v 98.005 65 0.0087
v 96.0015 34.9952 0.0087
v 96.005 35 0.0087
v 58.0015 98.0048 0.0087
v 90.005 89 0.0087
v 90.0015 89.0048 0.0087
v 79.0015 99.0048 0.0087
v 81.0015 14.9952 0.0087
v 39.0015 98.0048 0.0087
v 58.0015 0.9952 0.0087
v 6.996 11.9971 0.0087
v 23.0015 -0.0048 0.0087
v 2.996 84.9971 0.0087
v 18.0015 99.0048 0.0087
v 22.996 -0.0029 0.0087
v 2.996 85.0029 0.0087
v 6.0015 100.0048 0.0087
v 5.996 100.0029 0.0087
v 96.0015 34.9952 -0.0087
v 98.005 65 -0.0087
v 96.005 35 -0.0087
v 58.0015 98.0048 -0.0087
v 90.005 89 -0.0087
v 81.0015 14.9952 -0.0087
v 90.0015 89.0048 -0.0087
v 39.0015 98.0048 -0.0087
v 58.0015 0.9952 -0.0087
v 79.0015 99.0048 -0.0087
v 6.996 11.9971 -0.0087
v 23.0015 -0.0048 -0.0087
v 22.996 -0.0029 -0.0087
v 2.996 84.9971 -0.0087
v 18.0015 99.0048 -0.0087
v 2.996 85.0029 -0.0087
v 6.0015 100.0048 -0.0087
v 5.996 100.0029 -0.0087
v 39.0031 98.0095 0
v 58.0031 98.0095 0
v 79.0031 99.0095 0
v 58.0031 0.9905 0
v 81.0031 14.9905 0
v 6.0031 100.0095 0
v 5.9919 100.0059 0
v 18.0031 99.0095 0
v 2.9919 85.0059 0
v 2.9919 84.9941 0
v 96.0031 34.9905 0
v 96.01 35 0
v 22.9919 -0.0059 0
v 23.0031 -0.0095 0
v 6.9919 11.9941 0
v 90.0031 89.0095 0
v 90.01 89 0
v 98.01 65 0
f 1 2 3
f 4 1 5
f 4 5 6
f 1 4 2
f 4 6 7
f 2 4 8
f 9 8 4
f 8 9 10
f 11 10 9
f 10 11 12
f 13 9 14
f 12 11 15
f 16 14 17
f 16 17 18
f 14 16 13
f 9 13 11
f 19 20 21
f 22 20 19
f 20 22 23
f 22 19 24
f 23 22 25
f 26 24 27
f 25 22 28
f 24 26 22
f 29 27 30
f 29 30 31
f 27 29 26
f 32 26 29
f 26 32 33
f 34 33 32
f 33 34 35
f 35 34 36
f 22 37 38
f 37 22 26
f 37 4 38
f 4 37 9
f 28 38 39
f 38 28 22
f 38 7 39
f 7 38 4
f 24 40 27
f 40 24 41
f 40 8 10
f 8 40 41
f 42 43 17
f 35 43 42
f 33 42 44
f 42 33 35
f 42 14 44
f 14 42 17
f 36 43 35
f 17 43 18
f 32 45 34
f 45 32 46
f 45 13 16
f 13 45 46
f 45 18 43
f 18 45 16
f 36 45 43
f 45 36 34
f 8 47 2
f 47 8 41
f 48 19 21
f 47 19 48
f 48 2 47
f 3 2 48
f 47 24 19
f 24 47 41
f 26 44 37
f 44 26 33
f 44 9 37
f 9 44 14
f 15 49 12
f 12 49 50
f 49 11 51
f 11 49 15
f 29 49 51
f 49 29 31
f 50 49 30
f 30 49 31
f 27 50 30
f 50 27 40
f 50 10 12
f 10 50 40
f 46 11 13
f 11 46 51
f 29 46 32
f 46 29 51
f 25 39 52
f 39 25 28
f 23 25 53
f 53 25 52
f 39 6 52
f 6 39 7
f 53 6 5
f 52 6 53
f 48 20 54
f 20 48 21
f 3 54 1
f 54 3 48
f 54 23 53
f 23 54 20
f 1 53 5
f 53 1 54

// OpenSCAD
color([0.5839405385485582,0.4048698908705002,0.6877557316706271]) hull(){
    translate([18,58]) sphere(0.01);
    translate([18,24]) sphere(0.01);
    translate([26,51]) sphere(0.01);
}
color([0.29310936231965135,0.08456113000314536,0.6409271470126323]) hull(){
    translate([18,58]) sphere(0.01);
    translate([18,24]) sphere(0.01);
    translate([7,12]) sphere(0.01);
}
color([0.38512246522478266,0.6162859510128613,0.407224705538046]) hull(){
    translate([18,58]) sphere(0.01);
    translate([26,51]) sphere(0.01);
    translate([30,57]) sphere(0.01);
}
color([0.6107800780239486,0.9541913078580654,0.09369719926319908]) hull(){
    translate([18,58]) sphere(0.01);
    translate([30,57]) sphere(0.01);
    translate([16,79]) sphere(0.01);
}
color([0.4396226851829427,0.9817497074141792,0.30111933510979894]) hull(){
    translate([18,58]) sphere(0.01);
    translate([16,79]) sphere(0.01);
    translate([6,77]) sphere(0.01);
}
color([0.08571041628526821,0.691130580335744,0.16573157374072334]) hull(){
    translate([18,58]) sphere(0.01);
    translate([6,77]) sphere(0.01);
    translate([7,12]) sphere(0.01);
}
color([0.4668304924867862,0.30100213617539295,0.3511677492745029]) hull(){
    translate([58,98]) sphere(0.01);
    translate([50,93]) sphere(0.01);
    translate([64,91]) sphere(0.01);
}
color([0.05564944269037686,0.7696481469448815,0.686275624239137]) hull(){
    translate([58,98]) sphere(0.01);
    translate([50,93]) sphere(0.01);
    translate([51,97]) sphere(0.01);
}
color([0.15447252119296884,0.35335085758162643,0.18799175914388588]) hull(){
    translate([58,98]) sphere(0.01);
    translate([39,98]) sphere(0.01);
    translate([51,97]) sphere(0.01);
}
color([0.41322879780265653,0.82270842281296,0.9057146612667819]) hull(){
    translate([58,98]) sphere(0.01);
    translate([70,96]) sphere(0.01);
    translate([79,99]) sphere(0.01);
}
color([0.9688547633127277,0.5528378273263655,0.12760284187612392]) hull(){
    translate([58,98]) sphere(0.01);
    translate([70,96]) sphere(0.01);
    translate([64,91]) sphere(0.01);
}
color([0.1710979555253146,0.7131998843266452,0.6397779425125977]) hull(){
    translate([22,90]) sphere(0.01);
    translate([20,83]) sphere(0.01);
    translate([30,90]) sphere(0.01);
}
color([0.57496968906483,0.8489371230716904,0.07944838941339594]) hull(){
    translate([22,90]) sphere(0.01);
    translate([20,83]) sphere(0.01);
    translate([15,91]) sphere(0.01);
}
color([0.040333123224873146,0.9305910632054132,0.3080440975445232]) hull(){
    translate([22,90]) sphere(0.01);
    translate([18,99]) sphere(0.01);
    translate([31,91]) sphere(0.01);
}
color([0.6084655882345898,0.4923441190446234,0.7069385087242315]) hull(){
    translate([22,90]) sphere(0.01);
    translate([18,99]) sphere(0.01);
    translate([15,91]) sphere(0.01);
}
color([0.6803385961846494,0.18024793645131376,0.10787678186317007]) hull(){
    translate([22,90]) sphere(0.01);
    translate([31,91]) sphere(0.01);
    translate([30,90]) sphere(0.01);
}
color([0.1335624130282893,0.47731112778056706,0.8393950916733898]) hull(){
    translate([50,93]) sphere(0.01);
    translate([39,98]) sphere(0.01);
    translate([37,88]) sphere(0.01);
}
color([0.6780893207968227,0.08337096158279222,0.27725115680544954]) hull(){
    translate([50,93]) sphere(0.01);
    translate([39,98]) sphere(0.01);
    translate([51,97]) sphere(0.01);
}
color([0.9965791662073833,0.03375154870506614,0.10494976972159242]) hull(){
    translate([50,93]) sphere(0.01);
    translate([59,71]) sphere(0.01);
    translate([38,83]) sphere(0.01);
}
color([0.516844917539197,0.1360610465034362,0.543805910213663]) hull(){
    translate([50,93]) sphere(0.01);
    translate([59,71]) sphere(0.01);
    translate([63,74]) sphere(0.01);
}
color([0.04901628196141694,0.4867102513994055,0.8813892002857401]) hull(){
    translate([50,93]) sphere(0.01);
    translate([64,91]) sphere(0.01);
    translate([63,74]) sphere(0.01);
}
color([0.3053751014353143,0.40772022041766365,0.31297204198076634]) hull(){
    translate([50,93]) sphere(0.01);
    translate([37,88]) sphere(0.01);
    translate([38,83]) sphere(0.01);
}
color([0.49907796034366436,0.6160709555012981,0.9916538905911245]) hull(){
    translate([44,55]) sphere(0.01);
    translate([44,47]) sphere(0.01);
    translate([35,48]) sphere(0.01);
}
color([0.3123575451593331,0.46364206475662195,0.8862899719975306]) hull(){
    translate([44,55]) sphere(0.01);
    translate([44,47]) sphere(0.01);
    translate([77,50]) sphere(0.01);
}
color([0.5738800220993816,0.8494037217359881,0.24323676398212035]) hull(){
    translate([44,55]) sphere(0.01);
    translate([35,48]) sphere(0.01);
    translate([30,57]) sphere(0.01);
}
color([0.8402878098664139,0.9530478541805099,0.16594803365564914]) hull(){
    translate([44,55]) sphere(0.01);
    translate([77,50]) sphere(0.01);
    translate([46,61]) sphere(0.01);
}
color([0.0023370868964924796,0.7387895340607371,0.5374530602666081]) hull(){
    translate([44,55]) sphere(0.01);
    translate([30,57]) sphere(0.01);
    translate([39,67]) sphere(0.01);
}
color([0.25604025835089217,0.4320068924153808,0.5112453323210508]) hull(){
    translate([44,55]) sphere(0.01);
    translate([46,61]) sphere(0.01);
    translate([39,67]) sphere(0.01);
}
color([0.7462272619347637,0.5039790716190428,0.8850839351693509]) hull(){
    translate([64,14]) sphere(0.01);
    translate([68,15]) sphere(0.01);
    translate([72,20]) sphere(0.01);
}
color([0.6652757233710683,0.22263754843686523,0.08942086350367451]) hull(){
    translate([64,14]) sphere(0.01);
    translate([68,15]) sphere(0.01);
    translate([58,1]) sphere(0.01);
}
color([0.6195232841458308,0.9036720387350747,0.7222923954673625]) hull(){
    translate([64,14]) sphere(0.01);
    translate([58,33]) sphere(0.01);
    translate([72,20]) sphere(0.01);
}
color([0.6665075097113882,0.5421139713900744,0.6943978877819516]) hull(){
    translate([64,14]) sphere(0.01);
    translate([58,33]) sphere(0.01);
    translate([55,32]) sphere(0.01);
}
color([0.9269770591996176,0.12480324665016229,0.8422397758241813]) hull(){
    translate([64,14]) sphere(0.01);
    translate([42,29]) sphere(0.01);
    translate([55,32]) sphere(0.01);
}
color([0.028249143050612435,0.8554899328562455,0.6212809598996976]) hull(){
    translate([64,14]) sphere(0.01);
    translate([42,29]) sphere(0.01);
    translate([32,18]) sphere(0.01);
}
color([0.6435486749275994,0.4857227915978113,0.2898251547629681]) hull(){
    translate([64,14]) sphere(0.01);
    translate([32,18]) sphere(0.01);
    translate([58,1]) sphere(0.01);
}
color([0.21709076393122206,0.4979948584580751,0.6176241526046676]) hull(){
    translate([68,15]) sphere(0.01);
    translate([81,15]) sphere(0.01);
    translate([72,20]) sphere(0.01);
}
color([0.4722249532281336,0.7228331534363125,0.6109414561657331]) hull(){
    translate([68,15]) sphere(0.01);
    translate([81,15]) sphere(0.01);
    translate([58,1]) sphere(0.01);
}
color([0.5330085163671737,0.6769359871291822,0.5973748769978083]) hull(){
    translate([10,94]) sphere(0.01);
    translate([18,99]) sphere(0.01);
    translate([15,91]) sphere(0.01);
}
color([0.14460255854654236,0.21273280877313017,0.8417179364881341]) hull(){
    translate([10,94]) sphere(0.01);
    translate([18,99]) sphere(0.01);
    translate([6,100]) sphere(0.01);
}
color([0.6300391880279899,0.5103677782275869,0.4479627161837708]) hull(){
    translate([10,94]) sphere(0.01);
    translate([3,85]) sphere(0.01);
    translate([7,86]) sphere(0.01);
}
color([0.2903518628620462,0.1744676713524972,0.5457372127765215]) hull(){
    translate([10,94]) sphere(0.01);
    translate([3,85]) sphere(0.01);
    translate([6,100]) sphere(0.01);
}
color([0.6340658375422632,0.7004271366493812,0.690956934786038]) hull(){
    translate([10,94]) sphere(0.01);
    translate([7,86]) sphere(0.01);
    translate([15,91]) sphere(0.01);
}
color([0.013948469234104865,0.8018456354370093,0.2607079205191076]) hull(){
    translate([58,33]) sphere(0.01);
    translate([44,47]) sphere(0.01);
    translate([74,41]) sphere(0.01);
}
color([0.01899716010339858,0.7507132946374245,0.44168653561511173]) hull(){
    translate([58,33]) sphere(0.01);
    translate([44,47]) sphere(0.01);
    translate([45,42]) sphere(0.01);
}
color([0.1668653701245908,0.45955837321901094,0.7876756969907556]) hull(){
    translate([58,33]) sphere(0.01);
    translate([72,20]) sphere(0.01);
    translate([76,28]) sphere(0.01);
}
color([0.09564527702692727,0.06733136152719421,0.7816649665975636]) hull(){
    translate([58,33]) sphere(0.01);
    translate([55,32]) sphere(0.01);
    translate([45,42]) sphere(0.01);
}
color([0.030385075649315252,0.33346286891595733,0.08647112242809318]) hull(){
    translate([58,33]) sphere(0.01);
    translate([74,41]) sphere(0.01);
    translate([76,28]) sphere(0.01);
}
color([0.8161439782233904,0.05657658467482607,0.8243668117903717]) hull(){
    translate([6,84]) sphere(0.01);
    translate([3,85]) sphere(0.01);
    translate([6,77]) sphere(0.01);
}
color([0.05808931884644186,0.6181904095369413,0.1426995958976538]) hull(){
    translate([6,84]) sphere(0.01);
    translate([3,85]) sphere(0.01);
    translate([7,86]) sphere(0.01);
}
color([0.3846464495954227,0.3794414211645075,0.7643773332264734]) hull(){
    translate([6,84]) sphere(0.01);
    translate([16,79]) sphere(0.01);
    translate([6,77]) sphere(0.01);
}
color([0.3116889002403487,0.7690158776827113,0.7674729074453902]) hull(){
    translate([6,84]) sphere(0.01);
    translate([16,79]) sphere(0.01);
    translate([7,86]) sphere(0.01);
}
color([0.3394448706328078,0.45855440081433096,0.0007502935671159783]) hull(){
    translate([82,26]) sphere(0.01);
    translate([81,15]) sphere(0.01);
    translate([96,35]) sphere(0.01);
}
color([0.8084995756647368,0.0331322283588068,0.9954935019736515]) hull(){
    translate([82,26]) sphere(0.01);
    translate([81,15]) sphere(0.01);
    translate([79,27]) sphere(0.01);
}
color([0.32750610520168044,0.511786711221762,0.09639677946248049]) hull(){
    translate([82,26]) sphere(0.01);
    translate([75,43]) sphere(0.01);
    translate([74,41]) sphere(0.01);
}
color([0.46647601470953737,0.043404226035316795,0.8089506697449751]) hull(){
    translate([82,26]) sphere(0.01);
    translate([75,43]) sphere(0.01);
    translate([96,35]) sphere(0.01);
}
color([0.9065579579370614,0.48874197586323487,0.4689182776921319]) hull(){
    translate([82,26]) sphere(0.01);
    translate([74,41]) sphere(0.01);
    translate([79,27]) sphere(0.01);
}
color([0.9999833648369341,0.42392948264922625,0.11056216143511133]) hull(){
    translate([42,29]) sphere(0.01);
    translate([26,22]) sphere(0.01);
    translate([35,48]) sphere(0.01);
}
color([0.5007484231317689,0.23725843071495933,0.7435751616565288]) hull(){
    translate([42,29]) sphere(0.01);
    translate([26,22]) sphere(0.01);
    translate([32,18]) sphere(0.01);
}
color([0.030326511183225713,0.9534383365251057,0.44454391677925087]) hull(){
    translate([42,29]) sphere(0.01);
    translate([35,48]) sphere(0.01);
    translate([45,42]) sphere(0.01);
}
color([0.4017260225039573,0.6984802625757133,0.14751428227125585]) hull(){
    translate([42,29]) sphere(0.01);
    translate([55,32]) sphere(0.01);
    translate([45,42]) sphere(0.01);
}
color([0.592053202978914,0.7602792343344718,0.23214841748979886]) hull(){
    translate([39,98]) sphere(0.01);
    translate([18,99]) sphere(0.01);
    translate([31,91]) sphere(0.01);
}
color([0.2215781656479593,0.24536616409996503,0.7021925659500807]) hull(){
    translate([39,98]) sphere(0.01);
    translate([31,91]) sphere(0.01);
    translate([37,88]) sphere(0.01);
}
color([0.5457605096294114,0.54011508338913,0.5459453680001618]) hull(){
    translate([26,22]) sphere(0.01);
    translate([18,24]) sphere(0.01);
    translate([26,51]) sphere(0.01);
}
color([0.21439919344985514,0.4167057873106884,0.6193494045718565]) hull(){
    translate([26,22]) sphere(0.01);
    translate([18,24]) sphere(0.01);
    translate([24,21]) sphere(0.01);
}
color([0.45760594266221877,0.8933837090972113,0.8109172526149769]) hull(){
    translate([26,22]) sphere(0.01);
    translate([26,51]) sphere(0.01);
    translate([35,48]) sphere(0.01);
}
color([0.14833972802097417,0.6068004170768148,0.5080529466064481]) hull(){
    translate([26,22]) sphere(0.01);
    translate([24,21]) sphere(0.01);
    translate([32,18]) sphere(0.01);
}
color([0.9906187087676633,0.11352393843166497,0.6883720652754897]) hull(){
    translate([18,24]) sphere(0.01);
    translate([24,21]) sphere(0.01);
    translate([21,6]) sphere(0.01);
}
color([0.5952346609945763,0.6540807806784664,0.3474259839548979]) hull(){
    translate([18,24]) sphere(0.01);
    translate([7,12]) sphere(0.01);
    translate([21,6]) sphere(0.01);
}
color([0.9928586924360654,0.247192741454632,0.70975753974483]) hull(){
    translate([44,47]) sphere(0.01);
    translate([35,48]) sphere(0.01);
    translate([45,42]) sphere(0.01);
}
color([0.13794757021236903,0.4611444179186315,0.04899626755467579]) hull(){
    translate([44,47]) sphere(0.01);
    translate([77,50]) sphere(0.01);
    translate([75,43]) sphere(0.01);
}
color([0.1977229983916683,0.036370797334404625,0.13840798504488894]) hull(){
    translate([44,47]) sphere(0.01);
    translate([75,43]) sphere(0.01);
    translate([74,41]) sphere(0.01);
}
color([0.695134065044521,0.2654011745990712,0.4635417367699751]) hull(){
    translate([80,52]) sphere(0.01);
    translate([77,50]) sphere(0.01);
    translate([81,49]) sphere(0.01);
}
color([0.14067843926211876,0.3233092624720053,0.6766209265725885]) hull(){
    translate([80,52]) sphere(0.01);
    translate([77,50]) sphere(0.01);
    translate([63,74]) sphere(0.01);
}
color([0.5598941248919586,0.2674263193966361,0.7715367321750608]) hull(){
    translate([80,52]) sphere(0.01);
    translate([81,49]) sphere(0.01);
    translate([91,55]) sphere(0.01);
}
color([0.7775867750177572,0.3358457771023752,0.7984986383285079]) hull(){
    translate([80,52]) sphere(0.01);
    translate([91,55]) sphere(0.01);
    translate([93,72]) sphere(0.01);
}
color([0.3608344962449672,0.130636609727118,0.1470050456404287]) hull(){
    translate([80,52]) sphere(0.01);
    translate([63,74]) sphere(0.01);
    translate([93,72]) sphere(0.01);
}
color([0.5817121628313788,0.46286602772829477,0.8824527290015699]) hull(){
    translate([26,51]) sphere(0.01);
    translate([35,48]) sphere(0.01);
    translate([30,57]) sphere(0.01);
}
color([0.1201105517589024,0.1938197880719691,0.4695931850983104]) hull(){
    translate([59,71]) sphere(0.01);
    translate([77,50]) sphere(0.01);
    translate([46,61]) sphere(0.01);
}
color([0.14078313852784263,0.6451769219884874,0.9811903017448982]) hull(){
    translate([59,71]) sphere(0.01);
    translate([77,50]) sphere(0.01);
    translate([63,74]) sphere(0.01);
}
color([0.8740229692652243,0.6541461711493592,0.21289315855754942]) hull(){
    translate([59,71]) sphere(0.01);
    translate([43,69]) sphere(0.01);
    translate([46,61]) sphere(0.01);
}
color([0.9328418457966335,0.42345059226773774,0.5012376899041451]) hull(){
    translate([59,71]) sphere(0.01);
    translate([43,69]) sphere(0.01);
    translate([38,83]) sphere(0.01);
}
color([0.5811541702347708,0.2791891573101454,0.2092311813057095]) hull(){
    translate([20,83]) sphere(0.01);
    translate([16,79]) sphere(0.01);
    translate([15,91]) sphere(0.01);
}
color([0.9628933046967749,0.6198760626942967,0.5999578261672418]) hull(){
    translate([20,83]) sphere(0.01);
    translate([16,79]) sphere(0.01);
    translate([39,67]) sphere(0.01);
}
color([0.23874719597172656,0.5159213977515871,0.8042715508319355]) hull(){
    translate([20,83]) sphere(0.01);
    translate([38,83]) sphere(0.01);
    translate([30,90]) sphere(0.01);
}
color([0.6755197251802578,0.41487488756696345,0.5733633065217538]) hull(){
    translate([20,83]) sphere(0.01);
    translate([38,83]) sphere(0.01);
    translate([39,67]) sphere(0.01);
}
color([0.8352652083788017,0.4789645616530247,0.8888242662849705]) hull(){
    translate([81,15]) sphere(0.01);
    translate([72,20]) sphere(0.01);
    translate([79,27]) sphere(0.01);
}
color([0.7977003312522131,0.4430245559395397,0.5757872208285841]) hull(){
    translate([23,0]) sphere(0.01);
    translate([7,12]) sphere(0.01);
    translate([21,6]) sphere(0.01);
}
color([0.18894415855786206,0.8084526775944827,0.5240727557148024]) hull(){
    translate([23,0]) sphere(0.01);
    translate([32,18]) sphere(0.01);
    translate([21,6]) sphere(0.01);
}
color([0.33009817895383553,0.6358447971330878,0.274476683198677]) hull(){
    translate([23,0]) sphere(0.01);
    translate([32,18]) sphere(0.01);
    translate([58,1]) sphere(0.01);
}
color([0.7036882936284021,0.9548751840233447,0.5755708060880032]) hull(){
    translate([77,50]) sphere(0.01);
    translate([81,49]) sphere(0.01);
    translate([75,43]) sphere(0.01);
}
color([0.41204698353559877,0.5796286851254486,0.28286322414623355]) hull(){
    translate([72,20]) sphere(0.01);
    translate([76,28]) sphere(0.01);
    translate([79,27]) sphere(0.01);
}
color([0.83488960487533,0.7968053445508819,0.9111606805714901]) hull(){
    translate([24,21]) sphere(0.01);
    translate([32,18]) sphere(0.01);
    translate([21,6]) sphere(0.01);
}
color([0.24277728252059738,0.2698201644401115,0.25372921938475945]) hull(){
    translate([3,85]) sphere(0.01);
    translate([6,77]) sphere(0.01);
    translate([7,12]) sphere(0.01);
}
color([0.3248429479181304,0.33731838939050207,0.46012102584031667]) hull(){
    translate([30,57]) sphere(0.01);
    translate([16,79]) sphere(0.01);
    translate([39,67]) sphere(0.01);
}
color([0.4972140619467261,0.4460540182101679,0.582257111213957]) hull(){
    translate([81,49]) sphere(0.01);
    translate([75,43]) sphere(0.01);
    translate([96,35]) sphere(0.01);
}
color([0.38189019333285656,0.9329183366158048,0.74346568951076]) hull(){
    translate([81,49]) sphere(0.01);
    translate([91,55]) sphere(0.01);
    translate([96,35]) sphere(0.01);
}
color([0.10367473231816282,0.6513301228797536,0.21210212161149367]) hull(){
    translate([16,79]) sphere(0.01);
    translate([7,86]) sphere(0.01);
    translate([15,91]) sphere(0.01);
}
color([0.4071949612628585,0.6715659813617996,0.17871221391606673]) hull(){
    translate([70,96]) sphere(0.01);
    translate([79,99]) sphere(0.01);
    translate([83,95]) sphere(0.01);
}
color([0.17752412341011714,0.6556599876579107,0.7040052939421468]) hull(){
    translate([70,96]) sphere(0.01);
    translate([64,91]) sphere(0.01);
    translate([67,87]) sphere(0.01);
}
color([0.9236087761692187,0.21340315940002685,0.5989435772305987]) hull(){
    translate([70,96]) sphere(0.01);
    translate([67,87]) sphere(0.01);
    translate([83,95]) sphere(0.01);
}
color([0.8450733127471588,0.6003349610680997,0.5954496070156984]) hull(){
    translate([31,91]) sphere(0.01);
    translate([37,88]) sphere(0.01);
    translate([30,90]) sphere(0.01);
}
color([0.920709623693076,0.4233833186292486,0.4754938941291812]) hull(){
    translate([79,99]) sphere(0.01);
    translate([90,89]) sphere(0.01);
    translate([83,95]) sphere(0.01);
}
color([0.872421437716006,0.9767589381362137,0.9086126193256788]) hull(){
    translate([64,91]) sphere(0.01);
    translate([67,87]) sphere(0.01);
    translate([63,74]) sphere(0.01);
}
color([0.7884233486788577,0.8262914624918754,0.6636415038118221]) hull(){
    translate([37,88]) sphere(0.01);
    translate([38,83]) sphere(0.01);
    translate([30,90]) sphere(0.01);
}
color([0.36270118963089737,0.5138414630226216,0.14357255994509865]) hull(){
    translate([67,87]) sphere(0.01);
    translate([63,74]) sphere(0.01);
    translate([93,72]) sphere(0.01);
}
color([0.466624584989368,0.29734697142143796,0.9844700368526675]) hull(){
    translate([67,87]) sphere(0.01);
    translate([90,89]) sphere(0.01);
    translate([83,95]) sphere(0.01);
}
color([0.6752891164641136,0.29017518075598103,0.4342964607752302]) hull(){
    translate([67,87]) sphere(0.01);
    translate([90,89]) sphere(0.01);
    translate([93,72]) sphere(0.01);
}
color([0.773003957160343,0.565247166210502,0.9239404304157245]) hull(){
    translate([43,69]) sphere(0.01);
    translate([46,61]) sphere(0.01);
    translate([39,67]) sphere(0.01);
}
color([0.16032310979410902,0.8355206000915061,0.5688487402091276]) hull(){
    translate([43,69]) sphere(0.01);
    translate([38,83]) sphere(0.01);
    translate([39,67]) sphere(0.01);
}
color([0.20030491603062106,0.9799112189115262,0.7788088383598656]) hull(){
    translate([91,55]) sphere(0.01);
    translate([98,65]) sphere(0.01);
    translate([96,35]) sphere(0.01);
}
color([0.3331229107175697,0.956723341350572,0.8892995412421422]) hull(){
    translate([91,55]) sphere(0.01);
    translate([98,65]) sphere(0.01);
    translate([93,72]) sphere(0.01);
}
color([0.9938355783742772,0.5564778243748569,0.9329279768345969]) hull(){
    translate([98,65]) sphere(0.01);
    translate([90,89]) sphere(0.01);
    translate([93,72]) sphere(0.01);
}
color([0.35340897744289224,0.12062022214202717,0.7238287945893779]) hull(){
    translate([74,41]) sphere(0.01);
    translate([76,28]) sphere(0.01);
    translate([79,27]) sphere(0.01);
}
